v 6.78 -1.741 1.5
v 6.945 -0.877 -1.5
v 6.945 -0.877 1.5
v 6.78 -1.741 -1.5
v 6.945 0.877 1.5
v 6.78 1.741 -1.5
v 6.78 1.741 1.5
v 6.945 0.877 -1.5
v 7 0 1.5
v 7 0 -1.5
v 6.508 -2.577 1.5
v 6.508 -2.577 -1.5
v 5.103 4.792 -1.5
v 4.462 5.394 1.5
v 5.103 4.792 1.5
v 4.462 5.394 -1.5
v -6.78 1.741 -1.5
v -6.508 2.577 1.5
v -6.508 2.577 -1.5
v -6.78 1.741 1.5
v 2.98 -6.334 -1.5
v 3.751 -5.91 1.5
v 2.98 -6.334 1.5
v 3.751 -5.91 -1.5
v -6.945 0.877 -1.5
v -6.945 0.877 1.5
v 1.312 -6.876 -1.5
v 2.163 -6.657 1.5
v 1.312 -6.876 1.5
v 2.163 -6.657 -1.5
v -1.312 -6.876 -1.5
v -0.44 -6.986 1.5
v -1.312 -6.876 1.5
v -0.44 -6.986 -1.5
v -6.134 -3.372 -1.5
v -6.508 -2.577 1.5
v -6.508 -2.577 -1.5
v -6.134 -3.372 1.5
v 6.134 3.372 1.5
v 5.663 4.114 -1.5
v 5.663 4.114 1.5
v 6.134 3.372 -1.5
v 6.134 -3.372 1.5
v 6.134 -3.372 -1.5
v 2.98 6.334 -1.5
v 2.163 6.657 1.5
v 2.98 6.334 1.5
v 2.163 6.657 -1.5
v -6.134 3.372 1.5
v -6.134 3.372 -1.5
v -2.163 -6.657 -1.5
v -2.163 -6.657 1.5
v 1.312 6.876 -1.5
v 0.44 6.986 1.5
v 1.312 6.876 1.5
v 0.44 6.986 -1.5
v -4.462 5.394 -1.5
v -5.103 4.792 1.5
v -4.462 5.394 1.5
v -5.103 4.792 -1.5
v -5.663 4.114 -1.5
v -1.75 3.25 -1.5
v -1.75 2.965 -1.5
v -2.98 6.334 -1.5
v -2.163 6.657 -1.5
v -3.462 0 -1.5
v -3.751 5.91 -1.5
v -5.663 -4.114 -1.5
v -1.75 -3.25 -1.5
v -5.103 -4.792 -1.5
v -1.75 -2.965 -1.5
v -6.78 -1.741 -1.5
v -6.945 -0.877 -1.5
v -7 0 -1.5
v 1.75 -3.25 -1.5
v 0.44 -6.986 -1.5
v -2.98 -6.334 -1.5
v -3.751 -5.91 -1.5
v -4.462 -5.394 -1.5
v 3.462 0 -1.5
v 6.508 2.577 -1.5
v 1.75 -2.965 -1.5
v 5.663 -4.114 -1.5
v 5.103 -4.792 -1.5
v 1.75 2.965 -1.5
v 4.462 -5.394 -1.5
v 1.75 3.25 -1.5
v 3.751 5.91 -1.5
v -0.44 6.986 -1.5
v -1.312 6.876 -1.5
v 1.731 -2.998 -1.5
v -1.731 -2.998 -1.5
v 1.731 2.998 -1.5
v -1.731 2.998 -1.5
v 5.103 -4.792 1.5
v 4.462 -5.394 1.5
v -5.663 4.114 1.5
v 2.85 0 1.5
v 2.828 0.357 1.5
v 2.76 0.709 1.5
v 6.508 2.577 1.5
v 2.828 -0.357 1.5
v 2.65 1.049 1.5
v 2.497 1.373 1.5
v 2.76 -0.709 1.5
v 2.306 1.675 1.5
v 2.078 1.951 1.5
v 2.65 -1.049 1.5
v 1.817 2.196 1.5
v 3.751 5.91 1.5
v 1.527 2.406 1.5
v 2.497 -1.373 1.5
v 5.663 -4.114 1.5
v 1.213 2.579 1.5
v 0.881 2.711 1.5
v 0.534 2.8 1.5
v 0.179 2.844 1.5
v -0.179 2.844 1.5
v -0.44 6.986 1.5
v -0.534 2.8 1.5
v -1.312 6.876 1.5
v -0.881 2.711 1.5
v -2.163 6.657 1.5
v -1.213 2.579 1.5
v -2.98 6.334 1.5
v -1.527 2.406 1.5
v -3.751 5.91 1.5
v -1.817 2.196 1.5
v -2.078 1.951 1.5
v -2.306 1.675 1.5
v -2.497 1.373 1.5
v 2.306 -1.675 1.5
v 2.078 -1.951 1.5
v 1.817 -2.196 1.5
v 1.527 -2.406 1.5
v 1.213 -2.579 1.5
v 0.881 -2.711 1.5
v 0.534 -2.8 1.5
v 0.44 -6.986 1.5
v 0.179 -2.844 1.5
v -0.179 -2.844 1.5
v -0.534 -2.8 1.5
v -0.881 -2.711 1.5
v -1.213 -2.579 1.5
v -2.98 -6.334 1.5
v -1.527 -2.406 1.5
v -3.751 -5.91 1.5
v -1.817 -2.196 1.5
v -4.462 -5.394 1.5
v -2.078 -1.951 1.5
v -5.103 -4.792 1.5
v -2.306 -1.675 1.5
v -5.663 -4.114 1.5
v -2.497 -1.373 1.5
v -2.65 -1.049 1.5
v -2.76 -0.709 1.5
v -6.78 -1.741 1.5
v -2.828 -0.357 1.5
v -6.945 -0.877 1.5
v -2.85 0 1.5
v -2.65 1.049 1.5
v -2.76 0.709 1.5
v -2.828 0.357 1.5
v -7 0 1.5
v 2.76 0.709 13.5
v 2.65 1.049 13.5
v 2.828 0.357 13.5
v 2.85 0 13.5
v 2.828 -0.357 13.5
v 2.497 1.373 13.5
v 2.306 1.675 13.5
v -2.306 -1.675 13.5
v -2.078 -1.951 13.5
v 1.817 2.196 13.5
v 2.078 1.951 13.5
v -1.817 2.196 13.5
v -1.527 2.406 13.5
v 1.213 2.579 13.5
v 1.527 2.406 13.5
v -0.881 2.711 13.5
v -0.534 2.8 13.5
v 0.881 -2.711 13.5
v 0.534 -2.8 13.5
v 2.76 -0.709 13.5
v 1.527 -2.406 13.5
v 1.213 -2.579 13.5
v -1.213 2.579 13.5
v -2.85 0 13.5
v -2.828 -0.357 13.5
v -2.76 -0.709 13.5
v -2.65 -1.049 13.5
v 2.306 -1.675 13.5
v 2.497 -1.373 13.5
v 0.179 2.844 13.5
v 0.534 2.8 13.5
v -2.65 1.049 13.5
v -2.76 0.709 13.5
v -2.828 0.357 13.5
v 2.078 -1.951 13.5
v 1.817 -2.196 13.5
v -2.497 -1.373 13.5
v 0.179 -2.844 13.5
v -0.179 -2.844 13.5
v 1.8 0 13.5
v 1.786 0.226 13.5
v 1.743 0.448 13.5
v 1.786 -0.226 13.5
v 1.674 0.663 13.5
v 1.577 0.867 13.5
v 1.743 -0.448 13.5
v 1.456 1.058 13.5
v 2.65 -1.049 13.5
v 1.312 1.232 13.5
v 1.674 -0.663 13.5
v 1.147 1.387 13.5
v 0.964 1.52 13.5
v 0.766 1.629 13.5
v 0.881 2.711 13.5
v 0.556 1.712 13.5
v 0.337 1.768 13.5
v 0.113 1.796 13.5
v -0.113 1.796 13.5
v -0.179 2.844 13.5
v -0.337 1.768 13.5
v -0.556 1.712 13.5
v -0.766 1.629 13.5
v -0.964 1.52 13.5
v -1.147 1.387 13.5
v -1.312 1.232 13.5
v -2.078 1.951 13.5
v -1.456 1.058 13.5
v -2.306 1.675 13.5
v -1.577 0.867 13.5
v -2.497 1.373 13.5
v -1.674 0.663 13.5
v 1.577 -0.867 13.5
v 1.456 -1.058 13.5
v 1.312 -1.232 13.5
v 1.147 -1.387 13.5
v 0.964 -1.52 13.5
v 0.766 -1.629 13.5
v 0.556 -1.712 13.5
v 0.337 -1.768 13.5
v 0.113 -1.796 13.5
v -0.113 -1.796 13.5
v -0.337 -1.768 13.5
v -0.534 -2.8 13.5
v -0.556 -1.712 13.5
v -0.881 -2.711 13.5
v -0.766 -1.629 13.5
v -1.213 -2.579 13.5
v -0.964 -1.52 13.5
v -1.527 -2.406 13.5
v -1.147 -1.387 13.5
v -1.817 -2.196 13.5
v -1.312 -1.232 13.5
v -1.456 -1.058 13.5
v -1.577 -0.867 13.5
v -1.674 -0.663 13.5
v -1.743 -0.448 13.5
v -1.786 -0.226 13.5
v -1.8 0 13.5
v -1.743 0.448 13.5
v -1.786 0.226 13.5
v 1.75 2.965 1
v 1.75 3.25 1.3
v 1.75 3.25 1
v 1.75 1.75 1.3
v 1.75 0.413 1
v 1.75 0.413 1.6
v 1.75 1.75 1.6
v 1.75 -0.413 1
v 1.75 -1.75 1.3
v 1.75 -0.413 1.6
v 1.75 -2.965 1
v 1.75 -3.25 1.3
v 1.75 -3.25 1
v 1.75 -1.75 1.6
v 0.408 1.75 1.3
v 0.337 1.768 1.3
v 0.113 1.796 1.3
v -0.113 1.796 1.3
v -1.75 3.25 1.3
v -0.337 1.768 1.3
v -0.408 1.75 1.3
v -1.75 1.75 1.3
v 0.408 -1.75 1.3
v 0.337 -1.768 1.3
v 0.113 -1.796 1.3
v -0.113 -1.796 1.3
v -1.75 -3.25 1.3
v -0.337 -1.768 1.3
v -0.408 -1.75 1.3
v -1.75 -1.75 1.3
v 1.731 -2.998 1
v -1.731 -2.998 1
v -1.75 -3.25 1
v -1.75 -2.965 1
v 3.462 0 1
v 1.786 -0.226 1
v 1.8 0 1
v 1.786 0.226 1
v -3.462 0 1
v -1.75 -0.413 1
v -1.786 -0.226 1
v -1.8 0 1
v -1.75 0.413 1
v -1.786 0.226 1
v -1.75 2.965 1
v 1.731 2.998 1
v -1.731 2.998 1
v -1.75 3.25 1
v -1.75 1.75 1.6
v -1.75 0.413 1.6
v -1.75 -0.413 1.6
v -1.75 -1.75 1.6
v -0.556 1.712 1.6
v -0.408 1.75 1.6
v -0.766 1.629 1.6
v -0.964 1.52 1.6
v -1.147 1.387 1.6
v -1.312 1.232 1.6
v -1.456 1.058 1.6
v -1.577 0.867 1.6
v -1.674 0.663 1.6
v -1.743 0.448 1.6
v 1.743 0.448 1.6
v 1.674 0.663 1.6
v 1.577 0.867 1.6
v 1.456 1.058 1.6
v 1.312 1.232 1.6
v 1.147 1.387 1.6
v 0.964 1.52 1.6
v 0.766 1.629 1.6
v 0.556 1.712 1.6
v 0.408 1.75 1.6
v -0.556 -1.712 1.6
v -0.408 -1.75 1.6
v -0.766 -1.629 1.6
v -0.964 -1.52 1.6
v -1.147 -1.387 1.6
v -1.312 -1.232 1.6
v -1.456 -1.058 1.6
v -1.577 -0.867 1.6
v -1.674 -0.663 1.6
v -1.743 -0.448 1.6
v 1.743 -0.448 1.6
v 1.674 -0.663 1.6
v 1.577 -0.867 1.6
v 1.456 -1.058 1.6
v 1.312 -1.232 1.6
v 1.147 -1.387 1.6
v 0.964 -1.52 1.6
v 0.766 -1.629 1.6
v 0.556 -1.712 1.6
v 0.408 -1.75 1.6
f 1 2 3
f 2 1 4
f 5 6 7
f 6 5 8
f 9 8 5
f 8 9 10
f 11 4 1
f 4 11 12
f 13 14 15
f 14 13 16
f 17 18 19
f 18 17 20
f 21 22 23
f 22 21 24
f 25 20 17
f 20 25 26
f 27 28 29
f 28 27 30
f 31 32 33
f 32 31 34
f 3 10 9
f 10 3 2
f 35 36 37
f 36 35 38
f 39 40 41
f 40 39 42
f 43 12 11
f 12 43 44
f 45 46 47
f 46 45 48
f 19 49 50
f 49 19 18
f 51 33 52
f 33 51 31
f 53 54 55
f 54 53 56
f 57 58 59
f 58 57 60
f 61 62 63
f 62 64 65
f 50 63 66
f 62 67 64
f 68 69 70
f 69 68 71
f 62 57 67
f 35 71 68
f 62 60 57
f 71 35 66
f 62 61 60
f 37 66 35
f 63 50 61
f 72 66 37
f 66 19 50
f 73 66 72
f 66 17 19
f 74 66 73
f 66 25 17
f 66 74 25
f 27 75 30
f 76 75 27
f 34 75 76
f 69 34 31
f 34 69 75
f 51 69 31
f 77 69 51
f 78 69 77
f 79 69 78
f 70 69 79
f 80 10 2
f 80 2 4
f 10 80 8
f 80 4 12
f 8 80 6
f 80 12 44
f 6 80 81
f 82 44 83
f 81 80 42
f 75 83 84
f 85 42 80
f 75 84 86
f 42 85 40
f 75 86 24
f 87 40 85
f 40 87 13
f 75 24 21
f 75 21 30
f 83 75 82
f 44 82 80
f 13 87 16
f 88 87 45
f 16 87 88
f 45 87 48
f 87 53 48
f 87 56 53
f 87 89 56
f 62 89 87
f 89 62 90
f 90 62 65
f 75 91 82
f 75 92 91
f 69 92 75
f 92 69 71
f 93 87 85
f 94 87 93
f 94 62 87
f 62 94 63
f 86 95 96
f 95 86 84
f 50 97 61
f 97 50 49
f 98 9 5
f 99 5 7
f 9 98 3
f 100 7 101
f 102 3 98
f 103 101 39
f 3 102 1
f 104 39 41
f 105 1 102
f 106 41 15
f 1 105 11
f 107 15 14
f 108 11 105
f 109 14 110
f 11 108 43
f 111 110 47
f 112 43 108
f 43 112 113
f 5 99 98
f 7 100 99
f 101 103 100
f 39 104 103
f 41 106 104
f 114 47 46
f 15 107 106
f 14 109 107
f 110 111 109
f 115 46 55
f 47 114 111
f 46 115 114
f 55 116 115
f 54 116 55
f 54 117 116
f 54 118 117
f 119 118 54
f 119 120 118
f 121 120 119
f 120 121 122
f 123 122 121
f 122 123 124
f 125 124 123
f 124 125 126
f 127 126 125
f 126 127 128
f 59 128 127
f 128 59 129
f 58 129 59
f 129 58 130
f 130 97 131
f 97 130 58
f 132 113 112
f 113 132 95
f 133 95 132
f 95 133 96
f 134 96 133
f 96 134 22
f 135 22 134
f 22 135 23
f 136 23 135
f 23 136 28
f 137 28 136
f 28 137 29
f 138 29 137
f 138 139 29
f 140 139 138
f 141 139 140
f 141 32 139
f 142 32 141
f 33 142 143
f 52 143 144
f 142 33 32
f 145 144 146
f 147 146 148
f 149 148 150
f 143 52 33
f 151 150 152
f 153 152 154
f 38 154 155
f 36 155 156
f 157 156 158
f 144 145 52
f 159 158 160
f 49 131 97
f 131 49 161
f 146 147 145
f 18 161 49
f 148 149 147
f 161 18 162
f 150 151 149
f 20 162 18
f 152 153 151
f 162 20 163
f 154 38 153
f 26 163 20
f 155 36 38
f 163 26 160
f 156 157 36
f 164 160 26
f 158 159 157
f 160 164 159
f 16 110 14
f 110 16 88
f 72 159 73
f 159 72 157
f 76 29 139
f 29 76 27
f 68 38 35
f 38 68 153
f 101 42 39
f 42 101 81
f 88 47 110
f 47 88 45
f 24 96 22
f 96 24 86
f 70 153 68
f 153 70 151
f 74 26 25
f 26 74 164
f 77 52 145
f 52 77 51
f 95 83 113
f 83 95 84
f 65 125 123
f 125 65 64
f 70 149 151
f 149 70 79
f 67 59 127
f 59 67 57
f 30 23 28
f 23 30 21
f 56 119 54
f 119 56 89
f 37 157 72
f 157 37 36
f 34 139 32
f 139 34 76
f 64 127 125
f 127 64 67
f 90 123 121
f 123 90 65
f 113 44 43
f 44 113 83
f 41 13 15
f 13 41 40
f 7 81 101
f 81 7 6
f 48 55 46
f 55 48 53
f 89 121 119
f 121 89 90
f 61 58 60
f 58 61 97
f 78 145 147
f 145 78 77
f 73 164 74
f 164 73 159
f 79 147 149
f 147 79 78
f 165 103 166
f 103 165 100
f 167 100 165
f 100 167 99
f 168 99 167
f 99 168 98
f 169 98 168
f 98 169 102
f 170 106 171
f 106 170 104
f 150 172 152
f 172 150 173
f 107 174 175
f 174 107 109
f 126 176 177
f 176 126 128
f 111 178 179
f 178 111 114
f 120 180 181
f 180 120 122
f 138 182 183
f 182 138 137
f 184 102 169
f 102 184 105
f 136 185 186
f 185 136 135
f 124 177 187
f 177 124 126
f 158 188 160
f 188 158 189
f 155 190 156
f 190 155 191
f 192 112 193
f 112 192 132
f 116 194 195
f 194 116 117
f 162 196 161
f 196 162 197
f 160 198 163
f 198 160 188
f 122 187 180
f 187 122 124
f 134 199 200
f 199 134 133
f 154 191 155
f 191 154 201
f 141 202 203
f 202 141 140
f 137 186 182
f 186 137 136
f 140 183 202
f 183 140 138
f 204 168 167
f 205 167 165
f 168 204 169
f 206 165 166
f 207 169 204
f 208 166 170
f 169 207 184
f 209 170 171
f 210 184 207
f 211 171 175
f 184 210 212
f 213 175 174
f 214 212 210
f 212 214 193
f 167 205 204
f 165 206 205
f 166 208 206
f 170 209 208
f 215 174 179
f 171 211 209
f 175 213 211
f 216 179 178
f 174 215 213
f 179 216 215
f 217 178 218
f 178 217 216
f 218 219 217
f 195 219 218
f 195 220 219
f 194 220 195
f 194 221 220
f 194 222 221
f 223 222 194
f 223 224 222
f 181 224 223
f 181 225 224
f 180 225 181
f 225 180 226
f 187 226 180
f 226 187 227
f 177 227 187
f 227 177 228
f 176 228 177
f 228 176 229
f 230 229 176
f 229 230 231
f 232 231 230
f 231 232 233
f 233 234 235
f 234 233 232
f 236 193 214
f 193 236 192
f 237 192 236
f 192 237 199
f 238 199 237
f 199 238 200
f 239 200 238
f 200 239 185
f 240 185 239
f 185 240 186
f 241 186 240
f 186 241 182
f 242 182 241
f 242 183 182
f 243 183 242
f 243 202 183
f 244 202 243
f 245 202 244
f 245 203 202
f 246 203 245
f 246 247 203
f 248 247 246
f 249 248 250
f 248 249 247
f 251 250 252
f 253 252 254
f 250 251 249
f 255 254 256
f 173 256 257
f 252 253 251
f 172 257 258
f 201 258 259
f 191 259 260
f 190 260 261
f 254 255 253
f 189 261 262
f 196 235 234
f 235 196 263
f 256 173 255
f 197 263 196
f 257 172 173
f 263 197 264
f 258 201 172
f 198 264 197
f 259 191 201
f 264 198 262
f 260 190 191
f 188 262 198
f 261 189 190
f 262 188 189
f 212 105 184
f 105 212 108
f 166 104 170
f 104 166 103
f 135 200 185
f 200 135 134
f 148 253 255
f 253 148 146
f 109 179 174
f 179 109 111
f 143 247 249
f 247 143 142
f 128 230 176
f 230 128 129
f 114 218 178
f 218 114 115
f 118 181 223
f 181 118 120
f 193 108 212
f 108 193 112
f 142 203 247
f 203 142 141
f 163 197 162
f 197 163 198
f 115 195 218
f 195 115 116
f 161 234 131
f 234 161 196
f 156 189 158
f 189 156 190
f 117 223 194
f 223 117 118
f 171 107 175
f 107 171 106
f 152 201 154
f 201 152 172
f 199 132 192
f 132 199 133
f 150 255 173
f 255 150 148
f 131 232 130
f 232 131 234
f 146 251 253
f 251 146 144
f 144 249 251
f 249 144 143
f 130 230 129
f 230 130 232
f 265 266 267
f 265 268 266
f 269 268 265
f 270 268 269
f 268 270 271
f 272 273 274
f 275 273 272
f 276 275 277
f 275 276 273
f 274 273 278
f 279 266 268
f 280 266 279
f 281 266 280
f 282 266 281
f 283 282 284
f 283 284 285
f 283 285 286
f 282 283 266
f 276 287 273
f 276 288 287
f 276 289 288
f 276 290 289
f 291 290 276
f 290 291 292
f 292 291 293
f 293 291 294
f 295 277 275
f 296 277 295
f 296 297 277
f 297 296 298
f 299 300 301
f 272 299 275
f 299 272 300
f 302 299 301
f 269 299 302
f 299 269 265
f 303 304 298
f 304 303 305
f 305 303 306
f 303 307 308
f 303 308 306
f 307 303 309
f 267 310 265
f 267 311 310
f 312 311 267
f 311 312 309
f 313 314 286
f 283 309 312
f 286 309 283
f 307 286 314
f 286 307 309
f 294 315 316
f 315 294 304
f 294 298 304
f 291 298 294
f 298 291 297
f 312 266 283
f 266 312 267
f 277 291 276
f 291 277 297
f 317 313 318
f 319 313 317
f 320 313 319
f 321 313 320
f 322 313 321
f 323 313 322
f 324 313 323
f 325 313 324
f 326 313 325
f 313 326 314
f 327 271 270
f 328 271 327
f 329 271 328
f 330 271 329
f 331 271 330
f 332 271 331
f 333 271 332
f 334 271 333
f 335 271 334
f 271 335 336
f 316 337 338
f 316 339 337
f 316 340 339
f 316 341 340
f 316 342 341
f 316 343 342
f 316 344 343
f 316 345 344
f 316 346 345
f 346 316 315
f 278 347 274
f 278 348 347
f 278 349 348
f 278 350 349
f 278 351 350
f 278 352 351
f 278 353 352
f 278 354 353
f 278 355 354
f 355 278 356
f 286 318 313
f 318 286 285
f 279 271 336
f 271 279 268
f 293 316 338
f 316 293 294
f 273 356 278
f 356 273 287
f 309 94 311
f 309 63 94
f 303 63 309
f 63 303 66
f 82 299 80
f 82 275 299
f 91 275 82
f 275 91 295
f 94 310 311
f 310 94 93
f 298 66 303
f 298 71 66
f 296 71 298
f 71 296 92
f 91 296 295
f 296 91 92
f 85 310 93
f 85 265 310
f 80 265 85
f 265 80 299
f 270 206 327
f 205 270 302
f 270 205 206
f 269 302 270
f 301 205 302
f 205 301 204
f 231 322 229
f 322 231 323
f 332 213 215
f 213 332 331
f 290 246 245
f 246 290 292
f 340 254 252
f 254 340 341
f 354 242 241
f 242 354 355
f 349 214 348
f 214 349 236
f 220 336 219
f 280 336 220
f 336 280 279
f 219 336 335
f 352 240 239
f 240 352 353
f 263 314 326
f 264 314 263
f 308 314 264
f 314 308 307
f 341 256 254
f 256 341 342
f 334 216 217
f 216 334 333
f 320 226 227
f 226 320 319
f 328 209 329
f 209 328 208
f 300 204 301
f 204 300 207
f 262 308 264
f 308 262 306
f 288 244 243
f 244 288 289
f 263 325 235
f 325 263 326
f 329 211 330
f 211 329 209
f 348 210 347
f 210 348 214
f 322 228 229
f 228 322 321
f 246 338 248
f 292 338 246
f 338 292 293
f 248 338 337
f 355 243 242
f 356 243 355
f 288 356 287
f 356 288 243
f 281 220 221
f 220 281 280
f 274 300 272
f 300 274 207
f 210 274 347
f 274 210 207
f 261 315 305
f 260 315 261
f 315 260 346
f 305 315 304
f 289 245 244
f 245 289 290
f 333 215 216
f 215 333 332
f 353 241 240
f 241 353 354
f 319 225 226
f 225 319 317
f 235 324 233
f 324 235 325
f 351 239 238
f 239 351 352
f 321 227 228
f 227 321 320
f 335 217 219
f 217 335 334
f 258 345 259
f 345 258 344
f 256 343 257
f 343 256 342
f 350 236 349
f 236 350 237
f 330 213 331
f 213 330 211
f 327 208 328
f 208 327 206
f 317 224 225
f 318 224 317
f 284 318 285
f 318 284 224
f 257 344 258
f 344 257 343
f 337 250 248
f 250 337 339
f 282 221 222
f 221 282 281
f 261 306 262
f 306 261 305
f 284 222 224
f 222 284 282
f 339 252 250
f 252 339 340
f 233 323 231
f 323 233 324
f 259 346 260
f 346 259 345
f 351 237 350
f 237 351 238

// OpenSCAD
$fn = 50;


difference() {
	union() {
		translate(v = [0, 0, -1.5000000000]) {
			cylinder(h = 3, r = 7.0000000000);
		}
		translate(v = [0, 0, -1.5000000000]) {
			cylinder(h = 15, r = 2.8500000000);
		}
	}
	union() {
		translate(v = [0, 0, -1.5000000000]) {
			rotate(a = [0, 0, 0]) {
				difference() {
					union() {
						translate(v = [-1.7500000000, -3.2500000000, -0.3000000000]) {
							cube(size = [3.5000000000, 6.5000000000, 0.3000000000]);
						}
						translate(v = [-1.7500000000, -1.7500000000, -0.6000000000]) {
							cube(size = [3.5000000000, 3.5000000000, 0.3000000000]);
						}
						translate(v = [-1.7500000000, -3.2500000000, 2.5000000000]) {
							cube(size = [3.5000000000, 6.5000000000, 0.3000000000]);
						}
						translate(v = [-1.7500000000, -1.7500000000, 2.8000000000]) {
							cube(size = [3.5000000000, 3.5000000000, 0.3000000000]);
						}
						linear_extrude(height = 2.5000000000) {
							polygon(points = [[3.4620000000, 0.0000000000], [1.7310000000, 2.9981799479], [-1.7310000000, 2.9981799479], [-3.4620000000, 0.0000000000], [-1.7310000000, -2.9981799479], [1.7310000000, -2.9981799479]]);
						}
						translate(v = [-1.7500000000, -3.2500000000, -0.3000000000]) {
							cube(size = [3.5000000000, 6.5000000000, 0.3000000000]);
						}
						translate(v = [-1.7500000000, -1.7500000000, -0.6000000000]) {
							cube(size = [3.5000000000, 3.5000000000, 0.3000000000]);
						}
						translate(v = [-1.7500000000, -3.2500000000, 2.5000000000]) {
							cube(size = [3.5000000000, 6.5000000000, 0.3000000000]);
						}
						translate(v = [-1.7500000000, -1.7500000000, 2.8000000000]) {
							cube(size = [3.5000000000, 3.5000000000, 0.3000000000]);
						}
						translate(v = [-1.7500000000, -3.2500000000, -0.3000000000]) {
							cube(size = [3.5000000000, 6.5000000000, 0.3000000000]);
						}
						translate(v = [-1.7500000000, -1.7500000000, -0.6000000000]) {
							cube(size = [3.5000000000, 3.5000000000, 0.3000000000]);
						}
						translate(v = [-1.7500000000, -3.2500000000, 2.5000000000]) {
							cube(size = [3.5000000000, 6.5000000000, 0.3000000000]);
						}
						translate(v = [-1.7500000000, -1.7500000000, 2.8000000000]) {
							cube(size = [3.5000000000, 3.5000000000, 0.3000000000]);
						}
					}
					union();
				}
			}
		}
		translate(v = [0, 0, -100.0000000000]) {
			cylinder(h = 200, r = 1.8000000000);
		}
	}
}
